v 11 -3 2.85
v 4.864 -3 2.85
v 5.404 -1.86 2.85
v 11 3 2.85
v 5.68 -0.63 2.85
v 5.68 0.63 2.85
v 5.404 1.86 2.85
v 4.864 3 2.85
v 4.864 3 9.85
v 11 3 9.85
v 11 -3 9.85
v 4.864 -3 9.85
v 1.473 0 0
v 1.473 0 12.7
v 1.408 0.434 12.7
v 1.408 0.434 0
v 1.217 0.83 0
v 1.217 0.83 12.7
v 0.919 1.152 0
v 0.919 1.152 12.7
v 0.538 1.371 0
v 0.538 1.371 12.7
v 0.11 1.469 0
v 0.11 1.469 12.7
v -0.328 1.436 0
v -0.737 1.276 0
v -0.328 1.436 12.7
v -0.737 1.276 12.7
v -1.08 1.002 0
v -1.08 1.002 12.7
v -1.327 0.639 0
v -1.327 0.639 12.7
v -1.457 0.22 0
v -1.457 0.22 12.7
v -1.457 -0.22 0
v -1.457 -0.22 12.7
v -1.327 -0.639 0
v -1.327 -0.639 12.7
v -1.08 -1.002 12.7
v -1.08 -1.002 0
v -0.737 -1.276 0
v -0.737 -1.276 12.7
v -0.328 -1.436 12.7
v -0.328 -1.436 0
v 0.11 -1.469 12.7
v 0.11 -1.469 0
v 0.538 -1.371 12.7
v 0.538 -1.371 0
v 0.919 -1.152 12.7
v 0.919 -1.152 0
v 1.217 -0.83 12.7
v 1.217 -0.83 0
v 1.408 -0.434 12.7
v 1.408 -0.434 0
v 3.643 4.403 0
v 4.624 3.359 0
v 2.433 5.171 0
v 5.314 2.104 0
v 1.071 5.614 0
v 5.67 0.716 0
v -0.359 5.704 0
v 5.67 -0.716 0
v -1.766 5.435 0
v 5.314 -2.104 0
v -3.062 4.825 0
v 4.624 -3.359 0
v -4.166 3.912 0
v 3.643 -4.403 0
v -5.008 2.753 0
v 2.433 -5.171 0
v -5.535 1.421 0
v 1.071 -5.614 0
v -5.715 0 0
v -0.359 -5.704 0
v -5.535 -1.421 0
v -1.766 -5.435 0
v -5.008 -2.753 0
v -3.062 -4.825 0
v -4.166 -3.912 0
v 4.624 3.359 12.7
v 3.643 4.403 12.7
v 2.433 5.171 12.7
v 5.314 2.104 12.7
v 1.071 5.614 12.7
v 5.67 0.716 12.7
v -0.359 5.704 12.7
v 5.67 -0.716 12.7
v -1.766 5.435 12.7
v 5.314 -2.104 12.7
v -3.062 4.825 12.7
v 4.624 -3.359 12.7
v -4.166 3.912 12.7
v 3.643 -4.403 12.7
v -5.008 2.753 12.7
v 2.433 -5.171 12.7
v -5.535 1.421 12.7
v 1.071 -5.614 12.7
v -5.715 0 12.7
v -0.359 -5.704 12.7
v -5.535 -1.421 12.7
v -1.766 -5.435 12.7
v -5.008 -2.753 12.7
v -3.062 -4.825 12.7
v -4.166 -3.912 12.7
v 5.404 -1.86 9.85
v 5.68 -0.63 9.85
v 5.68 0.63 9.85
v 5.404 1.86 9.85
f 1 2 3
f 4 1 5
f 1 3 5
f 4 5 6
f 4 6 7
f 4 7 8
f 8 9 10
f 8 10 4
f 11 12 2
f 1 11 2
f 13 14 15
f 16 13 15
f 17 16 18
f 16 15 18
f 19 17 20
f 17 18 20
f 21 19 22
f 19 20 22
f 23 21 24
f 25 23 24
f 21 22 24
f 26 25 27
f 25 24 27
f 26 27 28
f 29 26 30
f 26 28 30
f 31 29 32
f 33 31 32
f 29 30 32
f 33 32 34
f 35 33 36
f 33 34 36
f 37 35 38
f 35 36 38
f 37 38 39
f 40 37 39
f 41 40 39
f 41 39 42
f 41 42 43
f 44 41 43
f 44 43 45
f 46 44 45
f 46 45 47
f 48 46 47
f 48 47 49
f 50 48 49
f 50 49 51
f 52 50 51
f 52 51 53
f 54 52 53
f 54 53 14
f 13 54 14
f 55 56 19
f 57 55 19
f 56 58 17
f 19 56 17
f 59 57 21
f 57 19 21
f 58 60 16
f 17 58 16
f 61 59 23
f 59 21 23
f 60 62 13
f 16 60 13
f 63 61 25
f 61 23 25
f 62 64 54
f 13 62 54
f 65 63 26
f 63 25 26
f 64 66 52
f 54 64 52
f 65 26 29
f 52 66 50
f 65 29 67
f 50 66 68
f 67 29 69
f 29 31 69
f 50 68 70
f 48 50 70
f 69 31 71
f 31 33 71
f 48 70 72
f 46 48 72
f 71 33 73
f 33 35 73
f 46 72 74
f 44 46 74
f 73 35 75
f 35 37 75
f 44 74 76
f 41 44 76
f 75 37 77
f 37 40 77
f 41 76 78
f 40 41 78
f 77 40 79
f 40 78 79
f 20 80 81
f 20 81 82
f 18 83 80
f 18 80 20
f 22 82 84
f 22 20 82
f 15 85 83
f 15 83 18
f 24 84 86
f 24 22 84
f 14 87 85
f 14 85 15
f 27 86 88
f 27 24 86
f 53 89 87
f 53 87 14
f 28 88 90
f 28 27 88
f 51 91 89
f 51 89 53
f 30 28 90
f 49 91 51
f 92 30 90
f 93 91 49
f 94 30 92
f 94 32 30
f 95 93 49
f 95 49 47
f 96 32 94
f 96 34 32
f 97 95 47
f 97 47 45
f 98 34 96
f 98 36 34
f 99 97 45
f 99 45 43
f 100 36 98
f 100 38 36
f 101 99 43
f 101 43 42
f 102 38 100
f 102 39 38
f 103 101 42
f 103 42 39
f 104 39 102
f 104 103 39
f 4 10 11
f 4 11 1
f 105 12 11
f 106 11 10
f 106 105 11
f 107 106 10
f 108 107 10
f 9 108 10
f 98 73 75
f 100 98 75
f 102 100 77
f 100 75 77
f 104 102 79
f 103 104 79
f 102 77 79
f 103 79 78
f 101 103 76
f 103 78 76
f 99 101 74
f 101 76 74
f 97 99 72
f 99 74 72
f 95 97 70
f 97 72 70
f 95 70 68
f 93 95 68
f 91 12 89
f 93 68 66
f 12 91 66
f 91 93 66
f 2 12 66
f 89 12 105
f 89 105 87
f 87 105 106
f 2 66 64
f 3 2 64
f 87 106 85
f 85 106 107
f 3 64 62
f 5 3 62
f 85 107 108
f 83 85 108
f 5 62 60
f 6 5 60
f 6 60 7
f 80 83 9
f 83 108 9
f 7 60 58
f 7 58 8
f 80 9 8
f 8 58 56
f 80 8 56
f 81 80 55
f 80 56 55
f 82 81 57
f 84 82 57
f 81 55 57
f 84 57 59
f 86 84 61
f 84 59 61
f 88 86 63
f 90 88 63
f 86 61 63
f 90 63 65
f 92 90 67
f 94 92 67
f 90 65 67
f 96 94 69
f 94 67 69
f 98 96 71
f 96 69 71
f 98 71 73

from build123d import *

# Parameters (mm, degrees)
SKETCH1_R           = 5.715
BOSS_EXTRUDE1_DEPTH = 12.7
SKETCH2_R           = 1.4732
CUT_EXTRUDE1_DEPTH  = 16.053652381
SKETCH3_W           = 7
SKETCH3_H           = 6
BOSS_EXTRUDE2_DEPTH = 7


with BuildPart() as part:
    # Sketch1 → Boss-Extrude1 (new body)
    with BuildSketch(Plane.XY):
        with Locations(Location((0, 0, 0), (0, 0, 180))):
            Circle(SKETCH1_R)
    extrude(amount=BOSS_EXTRUDE1_DEPTH)

    # Sketch2 → Cut-Extrude1 (cut, through all)
    with BuildSketch(Plane.XY.offset(12.7)):
        Circle(SKETCH2_R)
    extrude(amount=-CUT_EXTRUDE1_DEPTH, mode=Mode.SUBTRACT)

    # Sketch3 → Boss-Extrude2 (add)
    with BuildSketch(Plane(origin=(4, 0, 0), x_dir=(0, 0, -1), z_dir=(1, 0, 0))):
        with Locations((-6.35, 0)):
            Rectangle(SKETCH3_W, SKETCH3_H)
    extrude(amount=BOSS_EXTRUDE2_DEPTH)


solid = part.part
